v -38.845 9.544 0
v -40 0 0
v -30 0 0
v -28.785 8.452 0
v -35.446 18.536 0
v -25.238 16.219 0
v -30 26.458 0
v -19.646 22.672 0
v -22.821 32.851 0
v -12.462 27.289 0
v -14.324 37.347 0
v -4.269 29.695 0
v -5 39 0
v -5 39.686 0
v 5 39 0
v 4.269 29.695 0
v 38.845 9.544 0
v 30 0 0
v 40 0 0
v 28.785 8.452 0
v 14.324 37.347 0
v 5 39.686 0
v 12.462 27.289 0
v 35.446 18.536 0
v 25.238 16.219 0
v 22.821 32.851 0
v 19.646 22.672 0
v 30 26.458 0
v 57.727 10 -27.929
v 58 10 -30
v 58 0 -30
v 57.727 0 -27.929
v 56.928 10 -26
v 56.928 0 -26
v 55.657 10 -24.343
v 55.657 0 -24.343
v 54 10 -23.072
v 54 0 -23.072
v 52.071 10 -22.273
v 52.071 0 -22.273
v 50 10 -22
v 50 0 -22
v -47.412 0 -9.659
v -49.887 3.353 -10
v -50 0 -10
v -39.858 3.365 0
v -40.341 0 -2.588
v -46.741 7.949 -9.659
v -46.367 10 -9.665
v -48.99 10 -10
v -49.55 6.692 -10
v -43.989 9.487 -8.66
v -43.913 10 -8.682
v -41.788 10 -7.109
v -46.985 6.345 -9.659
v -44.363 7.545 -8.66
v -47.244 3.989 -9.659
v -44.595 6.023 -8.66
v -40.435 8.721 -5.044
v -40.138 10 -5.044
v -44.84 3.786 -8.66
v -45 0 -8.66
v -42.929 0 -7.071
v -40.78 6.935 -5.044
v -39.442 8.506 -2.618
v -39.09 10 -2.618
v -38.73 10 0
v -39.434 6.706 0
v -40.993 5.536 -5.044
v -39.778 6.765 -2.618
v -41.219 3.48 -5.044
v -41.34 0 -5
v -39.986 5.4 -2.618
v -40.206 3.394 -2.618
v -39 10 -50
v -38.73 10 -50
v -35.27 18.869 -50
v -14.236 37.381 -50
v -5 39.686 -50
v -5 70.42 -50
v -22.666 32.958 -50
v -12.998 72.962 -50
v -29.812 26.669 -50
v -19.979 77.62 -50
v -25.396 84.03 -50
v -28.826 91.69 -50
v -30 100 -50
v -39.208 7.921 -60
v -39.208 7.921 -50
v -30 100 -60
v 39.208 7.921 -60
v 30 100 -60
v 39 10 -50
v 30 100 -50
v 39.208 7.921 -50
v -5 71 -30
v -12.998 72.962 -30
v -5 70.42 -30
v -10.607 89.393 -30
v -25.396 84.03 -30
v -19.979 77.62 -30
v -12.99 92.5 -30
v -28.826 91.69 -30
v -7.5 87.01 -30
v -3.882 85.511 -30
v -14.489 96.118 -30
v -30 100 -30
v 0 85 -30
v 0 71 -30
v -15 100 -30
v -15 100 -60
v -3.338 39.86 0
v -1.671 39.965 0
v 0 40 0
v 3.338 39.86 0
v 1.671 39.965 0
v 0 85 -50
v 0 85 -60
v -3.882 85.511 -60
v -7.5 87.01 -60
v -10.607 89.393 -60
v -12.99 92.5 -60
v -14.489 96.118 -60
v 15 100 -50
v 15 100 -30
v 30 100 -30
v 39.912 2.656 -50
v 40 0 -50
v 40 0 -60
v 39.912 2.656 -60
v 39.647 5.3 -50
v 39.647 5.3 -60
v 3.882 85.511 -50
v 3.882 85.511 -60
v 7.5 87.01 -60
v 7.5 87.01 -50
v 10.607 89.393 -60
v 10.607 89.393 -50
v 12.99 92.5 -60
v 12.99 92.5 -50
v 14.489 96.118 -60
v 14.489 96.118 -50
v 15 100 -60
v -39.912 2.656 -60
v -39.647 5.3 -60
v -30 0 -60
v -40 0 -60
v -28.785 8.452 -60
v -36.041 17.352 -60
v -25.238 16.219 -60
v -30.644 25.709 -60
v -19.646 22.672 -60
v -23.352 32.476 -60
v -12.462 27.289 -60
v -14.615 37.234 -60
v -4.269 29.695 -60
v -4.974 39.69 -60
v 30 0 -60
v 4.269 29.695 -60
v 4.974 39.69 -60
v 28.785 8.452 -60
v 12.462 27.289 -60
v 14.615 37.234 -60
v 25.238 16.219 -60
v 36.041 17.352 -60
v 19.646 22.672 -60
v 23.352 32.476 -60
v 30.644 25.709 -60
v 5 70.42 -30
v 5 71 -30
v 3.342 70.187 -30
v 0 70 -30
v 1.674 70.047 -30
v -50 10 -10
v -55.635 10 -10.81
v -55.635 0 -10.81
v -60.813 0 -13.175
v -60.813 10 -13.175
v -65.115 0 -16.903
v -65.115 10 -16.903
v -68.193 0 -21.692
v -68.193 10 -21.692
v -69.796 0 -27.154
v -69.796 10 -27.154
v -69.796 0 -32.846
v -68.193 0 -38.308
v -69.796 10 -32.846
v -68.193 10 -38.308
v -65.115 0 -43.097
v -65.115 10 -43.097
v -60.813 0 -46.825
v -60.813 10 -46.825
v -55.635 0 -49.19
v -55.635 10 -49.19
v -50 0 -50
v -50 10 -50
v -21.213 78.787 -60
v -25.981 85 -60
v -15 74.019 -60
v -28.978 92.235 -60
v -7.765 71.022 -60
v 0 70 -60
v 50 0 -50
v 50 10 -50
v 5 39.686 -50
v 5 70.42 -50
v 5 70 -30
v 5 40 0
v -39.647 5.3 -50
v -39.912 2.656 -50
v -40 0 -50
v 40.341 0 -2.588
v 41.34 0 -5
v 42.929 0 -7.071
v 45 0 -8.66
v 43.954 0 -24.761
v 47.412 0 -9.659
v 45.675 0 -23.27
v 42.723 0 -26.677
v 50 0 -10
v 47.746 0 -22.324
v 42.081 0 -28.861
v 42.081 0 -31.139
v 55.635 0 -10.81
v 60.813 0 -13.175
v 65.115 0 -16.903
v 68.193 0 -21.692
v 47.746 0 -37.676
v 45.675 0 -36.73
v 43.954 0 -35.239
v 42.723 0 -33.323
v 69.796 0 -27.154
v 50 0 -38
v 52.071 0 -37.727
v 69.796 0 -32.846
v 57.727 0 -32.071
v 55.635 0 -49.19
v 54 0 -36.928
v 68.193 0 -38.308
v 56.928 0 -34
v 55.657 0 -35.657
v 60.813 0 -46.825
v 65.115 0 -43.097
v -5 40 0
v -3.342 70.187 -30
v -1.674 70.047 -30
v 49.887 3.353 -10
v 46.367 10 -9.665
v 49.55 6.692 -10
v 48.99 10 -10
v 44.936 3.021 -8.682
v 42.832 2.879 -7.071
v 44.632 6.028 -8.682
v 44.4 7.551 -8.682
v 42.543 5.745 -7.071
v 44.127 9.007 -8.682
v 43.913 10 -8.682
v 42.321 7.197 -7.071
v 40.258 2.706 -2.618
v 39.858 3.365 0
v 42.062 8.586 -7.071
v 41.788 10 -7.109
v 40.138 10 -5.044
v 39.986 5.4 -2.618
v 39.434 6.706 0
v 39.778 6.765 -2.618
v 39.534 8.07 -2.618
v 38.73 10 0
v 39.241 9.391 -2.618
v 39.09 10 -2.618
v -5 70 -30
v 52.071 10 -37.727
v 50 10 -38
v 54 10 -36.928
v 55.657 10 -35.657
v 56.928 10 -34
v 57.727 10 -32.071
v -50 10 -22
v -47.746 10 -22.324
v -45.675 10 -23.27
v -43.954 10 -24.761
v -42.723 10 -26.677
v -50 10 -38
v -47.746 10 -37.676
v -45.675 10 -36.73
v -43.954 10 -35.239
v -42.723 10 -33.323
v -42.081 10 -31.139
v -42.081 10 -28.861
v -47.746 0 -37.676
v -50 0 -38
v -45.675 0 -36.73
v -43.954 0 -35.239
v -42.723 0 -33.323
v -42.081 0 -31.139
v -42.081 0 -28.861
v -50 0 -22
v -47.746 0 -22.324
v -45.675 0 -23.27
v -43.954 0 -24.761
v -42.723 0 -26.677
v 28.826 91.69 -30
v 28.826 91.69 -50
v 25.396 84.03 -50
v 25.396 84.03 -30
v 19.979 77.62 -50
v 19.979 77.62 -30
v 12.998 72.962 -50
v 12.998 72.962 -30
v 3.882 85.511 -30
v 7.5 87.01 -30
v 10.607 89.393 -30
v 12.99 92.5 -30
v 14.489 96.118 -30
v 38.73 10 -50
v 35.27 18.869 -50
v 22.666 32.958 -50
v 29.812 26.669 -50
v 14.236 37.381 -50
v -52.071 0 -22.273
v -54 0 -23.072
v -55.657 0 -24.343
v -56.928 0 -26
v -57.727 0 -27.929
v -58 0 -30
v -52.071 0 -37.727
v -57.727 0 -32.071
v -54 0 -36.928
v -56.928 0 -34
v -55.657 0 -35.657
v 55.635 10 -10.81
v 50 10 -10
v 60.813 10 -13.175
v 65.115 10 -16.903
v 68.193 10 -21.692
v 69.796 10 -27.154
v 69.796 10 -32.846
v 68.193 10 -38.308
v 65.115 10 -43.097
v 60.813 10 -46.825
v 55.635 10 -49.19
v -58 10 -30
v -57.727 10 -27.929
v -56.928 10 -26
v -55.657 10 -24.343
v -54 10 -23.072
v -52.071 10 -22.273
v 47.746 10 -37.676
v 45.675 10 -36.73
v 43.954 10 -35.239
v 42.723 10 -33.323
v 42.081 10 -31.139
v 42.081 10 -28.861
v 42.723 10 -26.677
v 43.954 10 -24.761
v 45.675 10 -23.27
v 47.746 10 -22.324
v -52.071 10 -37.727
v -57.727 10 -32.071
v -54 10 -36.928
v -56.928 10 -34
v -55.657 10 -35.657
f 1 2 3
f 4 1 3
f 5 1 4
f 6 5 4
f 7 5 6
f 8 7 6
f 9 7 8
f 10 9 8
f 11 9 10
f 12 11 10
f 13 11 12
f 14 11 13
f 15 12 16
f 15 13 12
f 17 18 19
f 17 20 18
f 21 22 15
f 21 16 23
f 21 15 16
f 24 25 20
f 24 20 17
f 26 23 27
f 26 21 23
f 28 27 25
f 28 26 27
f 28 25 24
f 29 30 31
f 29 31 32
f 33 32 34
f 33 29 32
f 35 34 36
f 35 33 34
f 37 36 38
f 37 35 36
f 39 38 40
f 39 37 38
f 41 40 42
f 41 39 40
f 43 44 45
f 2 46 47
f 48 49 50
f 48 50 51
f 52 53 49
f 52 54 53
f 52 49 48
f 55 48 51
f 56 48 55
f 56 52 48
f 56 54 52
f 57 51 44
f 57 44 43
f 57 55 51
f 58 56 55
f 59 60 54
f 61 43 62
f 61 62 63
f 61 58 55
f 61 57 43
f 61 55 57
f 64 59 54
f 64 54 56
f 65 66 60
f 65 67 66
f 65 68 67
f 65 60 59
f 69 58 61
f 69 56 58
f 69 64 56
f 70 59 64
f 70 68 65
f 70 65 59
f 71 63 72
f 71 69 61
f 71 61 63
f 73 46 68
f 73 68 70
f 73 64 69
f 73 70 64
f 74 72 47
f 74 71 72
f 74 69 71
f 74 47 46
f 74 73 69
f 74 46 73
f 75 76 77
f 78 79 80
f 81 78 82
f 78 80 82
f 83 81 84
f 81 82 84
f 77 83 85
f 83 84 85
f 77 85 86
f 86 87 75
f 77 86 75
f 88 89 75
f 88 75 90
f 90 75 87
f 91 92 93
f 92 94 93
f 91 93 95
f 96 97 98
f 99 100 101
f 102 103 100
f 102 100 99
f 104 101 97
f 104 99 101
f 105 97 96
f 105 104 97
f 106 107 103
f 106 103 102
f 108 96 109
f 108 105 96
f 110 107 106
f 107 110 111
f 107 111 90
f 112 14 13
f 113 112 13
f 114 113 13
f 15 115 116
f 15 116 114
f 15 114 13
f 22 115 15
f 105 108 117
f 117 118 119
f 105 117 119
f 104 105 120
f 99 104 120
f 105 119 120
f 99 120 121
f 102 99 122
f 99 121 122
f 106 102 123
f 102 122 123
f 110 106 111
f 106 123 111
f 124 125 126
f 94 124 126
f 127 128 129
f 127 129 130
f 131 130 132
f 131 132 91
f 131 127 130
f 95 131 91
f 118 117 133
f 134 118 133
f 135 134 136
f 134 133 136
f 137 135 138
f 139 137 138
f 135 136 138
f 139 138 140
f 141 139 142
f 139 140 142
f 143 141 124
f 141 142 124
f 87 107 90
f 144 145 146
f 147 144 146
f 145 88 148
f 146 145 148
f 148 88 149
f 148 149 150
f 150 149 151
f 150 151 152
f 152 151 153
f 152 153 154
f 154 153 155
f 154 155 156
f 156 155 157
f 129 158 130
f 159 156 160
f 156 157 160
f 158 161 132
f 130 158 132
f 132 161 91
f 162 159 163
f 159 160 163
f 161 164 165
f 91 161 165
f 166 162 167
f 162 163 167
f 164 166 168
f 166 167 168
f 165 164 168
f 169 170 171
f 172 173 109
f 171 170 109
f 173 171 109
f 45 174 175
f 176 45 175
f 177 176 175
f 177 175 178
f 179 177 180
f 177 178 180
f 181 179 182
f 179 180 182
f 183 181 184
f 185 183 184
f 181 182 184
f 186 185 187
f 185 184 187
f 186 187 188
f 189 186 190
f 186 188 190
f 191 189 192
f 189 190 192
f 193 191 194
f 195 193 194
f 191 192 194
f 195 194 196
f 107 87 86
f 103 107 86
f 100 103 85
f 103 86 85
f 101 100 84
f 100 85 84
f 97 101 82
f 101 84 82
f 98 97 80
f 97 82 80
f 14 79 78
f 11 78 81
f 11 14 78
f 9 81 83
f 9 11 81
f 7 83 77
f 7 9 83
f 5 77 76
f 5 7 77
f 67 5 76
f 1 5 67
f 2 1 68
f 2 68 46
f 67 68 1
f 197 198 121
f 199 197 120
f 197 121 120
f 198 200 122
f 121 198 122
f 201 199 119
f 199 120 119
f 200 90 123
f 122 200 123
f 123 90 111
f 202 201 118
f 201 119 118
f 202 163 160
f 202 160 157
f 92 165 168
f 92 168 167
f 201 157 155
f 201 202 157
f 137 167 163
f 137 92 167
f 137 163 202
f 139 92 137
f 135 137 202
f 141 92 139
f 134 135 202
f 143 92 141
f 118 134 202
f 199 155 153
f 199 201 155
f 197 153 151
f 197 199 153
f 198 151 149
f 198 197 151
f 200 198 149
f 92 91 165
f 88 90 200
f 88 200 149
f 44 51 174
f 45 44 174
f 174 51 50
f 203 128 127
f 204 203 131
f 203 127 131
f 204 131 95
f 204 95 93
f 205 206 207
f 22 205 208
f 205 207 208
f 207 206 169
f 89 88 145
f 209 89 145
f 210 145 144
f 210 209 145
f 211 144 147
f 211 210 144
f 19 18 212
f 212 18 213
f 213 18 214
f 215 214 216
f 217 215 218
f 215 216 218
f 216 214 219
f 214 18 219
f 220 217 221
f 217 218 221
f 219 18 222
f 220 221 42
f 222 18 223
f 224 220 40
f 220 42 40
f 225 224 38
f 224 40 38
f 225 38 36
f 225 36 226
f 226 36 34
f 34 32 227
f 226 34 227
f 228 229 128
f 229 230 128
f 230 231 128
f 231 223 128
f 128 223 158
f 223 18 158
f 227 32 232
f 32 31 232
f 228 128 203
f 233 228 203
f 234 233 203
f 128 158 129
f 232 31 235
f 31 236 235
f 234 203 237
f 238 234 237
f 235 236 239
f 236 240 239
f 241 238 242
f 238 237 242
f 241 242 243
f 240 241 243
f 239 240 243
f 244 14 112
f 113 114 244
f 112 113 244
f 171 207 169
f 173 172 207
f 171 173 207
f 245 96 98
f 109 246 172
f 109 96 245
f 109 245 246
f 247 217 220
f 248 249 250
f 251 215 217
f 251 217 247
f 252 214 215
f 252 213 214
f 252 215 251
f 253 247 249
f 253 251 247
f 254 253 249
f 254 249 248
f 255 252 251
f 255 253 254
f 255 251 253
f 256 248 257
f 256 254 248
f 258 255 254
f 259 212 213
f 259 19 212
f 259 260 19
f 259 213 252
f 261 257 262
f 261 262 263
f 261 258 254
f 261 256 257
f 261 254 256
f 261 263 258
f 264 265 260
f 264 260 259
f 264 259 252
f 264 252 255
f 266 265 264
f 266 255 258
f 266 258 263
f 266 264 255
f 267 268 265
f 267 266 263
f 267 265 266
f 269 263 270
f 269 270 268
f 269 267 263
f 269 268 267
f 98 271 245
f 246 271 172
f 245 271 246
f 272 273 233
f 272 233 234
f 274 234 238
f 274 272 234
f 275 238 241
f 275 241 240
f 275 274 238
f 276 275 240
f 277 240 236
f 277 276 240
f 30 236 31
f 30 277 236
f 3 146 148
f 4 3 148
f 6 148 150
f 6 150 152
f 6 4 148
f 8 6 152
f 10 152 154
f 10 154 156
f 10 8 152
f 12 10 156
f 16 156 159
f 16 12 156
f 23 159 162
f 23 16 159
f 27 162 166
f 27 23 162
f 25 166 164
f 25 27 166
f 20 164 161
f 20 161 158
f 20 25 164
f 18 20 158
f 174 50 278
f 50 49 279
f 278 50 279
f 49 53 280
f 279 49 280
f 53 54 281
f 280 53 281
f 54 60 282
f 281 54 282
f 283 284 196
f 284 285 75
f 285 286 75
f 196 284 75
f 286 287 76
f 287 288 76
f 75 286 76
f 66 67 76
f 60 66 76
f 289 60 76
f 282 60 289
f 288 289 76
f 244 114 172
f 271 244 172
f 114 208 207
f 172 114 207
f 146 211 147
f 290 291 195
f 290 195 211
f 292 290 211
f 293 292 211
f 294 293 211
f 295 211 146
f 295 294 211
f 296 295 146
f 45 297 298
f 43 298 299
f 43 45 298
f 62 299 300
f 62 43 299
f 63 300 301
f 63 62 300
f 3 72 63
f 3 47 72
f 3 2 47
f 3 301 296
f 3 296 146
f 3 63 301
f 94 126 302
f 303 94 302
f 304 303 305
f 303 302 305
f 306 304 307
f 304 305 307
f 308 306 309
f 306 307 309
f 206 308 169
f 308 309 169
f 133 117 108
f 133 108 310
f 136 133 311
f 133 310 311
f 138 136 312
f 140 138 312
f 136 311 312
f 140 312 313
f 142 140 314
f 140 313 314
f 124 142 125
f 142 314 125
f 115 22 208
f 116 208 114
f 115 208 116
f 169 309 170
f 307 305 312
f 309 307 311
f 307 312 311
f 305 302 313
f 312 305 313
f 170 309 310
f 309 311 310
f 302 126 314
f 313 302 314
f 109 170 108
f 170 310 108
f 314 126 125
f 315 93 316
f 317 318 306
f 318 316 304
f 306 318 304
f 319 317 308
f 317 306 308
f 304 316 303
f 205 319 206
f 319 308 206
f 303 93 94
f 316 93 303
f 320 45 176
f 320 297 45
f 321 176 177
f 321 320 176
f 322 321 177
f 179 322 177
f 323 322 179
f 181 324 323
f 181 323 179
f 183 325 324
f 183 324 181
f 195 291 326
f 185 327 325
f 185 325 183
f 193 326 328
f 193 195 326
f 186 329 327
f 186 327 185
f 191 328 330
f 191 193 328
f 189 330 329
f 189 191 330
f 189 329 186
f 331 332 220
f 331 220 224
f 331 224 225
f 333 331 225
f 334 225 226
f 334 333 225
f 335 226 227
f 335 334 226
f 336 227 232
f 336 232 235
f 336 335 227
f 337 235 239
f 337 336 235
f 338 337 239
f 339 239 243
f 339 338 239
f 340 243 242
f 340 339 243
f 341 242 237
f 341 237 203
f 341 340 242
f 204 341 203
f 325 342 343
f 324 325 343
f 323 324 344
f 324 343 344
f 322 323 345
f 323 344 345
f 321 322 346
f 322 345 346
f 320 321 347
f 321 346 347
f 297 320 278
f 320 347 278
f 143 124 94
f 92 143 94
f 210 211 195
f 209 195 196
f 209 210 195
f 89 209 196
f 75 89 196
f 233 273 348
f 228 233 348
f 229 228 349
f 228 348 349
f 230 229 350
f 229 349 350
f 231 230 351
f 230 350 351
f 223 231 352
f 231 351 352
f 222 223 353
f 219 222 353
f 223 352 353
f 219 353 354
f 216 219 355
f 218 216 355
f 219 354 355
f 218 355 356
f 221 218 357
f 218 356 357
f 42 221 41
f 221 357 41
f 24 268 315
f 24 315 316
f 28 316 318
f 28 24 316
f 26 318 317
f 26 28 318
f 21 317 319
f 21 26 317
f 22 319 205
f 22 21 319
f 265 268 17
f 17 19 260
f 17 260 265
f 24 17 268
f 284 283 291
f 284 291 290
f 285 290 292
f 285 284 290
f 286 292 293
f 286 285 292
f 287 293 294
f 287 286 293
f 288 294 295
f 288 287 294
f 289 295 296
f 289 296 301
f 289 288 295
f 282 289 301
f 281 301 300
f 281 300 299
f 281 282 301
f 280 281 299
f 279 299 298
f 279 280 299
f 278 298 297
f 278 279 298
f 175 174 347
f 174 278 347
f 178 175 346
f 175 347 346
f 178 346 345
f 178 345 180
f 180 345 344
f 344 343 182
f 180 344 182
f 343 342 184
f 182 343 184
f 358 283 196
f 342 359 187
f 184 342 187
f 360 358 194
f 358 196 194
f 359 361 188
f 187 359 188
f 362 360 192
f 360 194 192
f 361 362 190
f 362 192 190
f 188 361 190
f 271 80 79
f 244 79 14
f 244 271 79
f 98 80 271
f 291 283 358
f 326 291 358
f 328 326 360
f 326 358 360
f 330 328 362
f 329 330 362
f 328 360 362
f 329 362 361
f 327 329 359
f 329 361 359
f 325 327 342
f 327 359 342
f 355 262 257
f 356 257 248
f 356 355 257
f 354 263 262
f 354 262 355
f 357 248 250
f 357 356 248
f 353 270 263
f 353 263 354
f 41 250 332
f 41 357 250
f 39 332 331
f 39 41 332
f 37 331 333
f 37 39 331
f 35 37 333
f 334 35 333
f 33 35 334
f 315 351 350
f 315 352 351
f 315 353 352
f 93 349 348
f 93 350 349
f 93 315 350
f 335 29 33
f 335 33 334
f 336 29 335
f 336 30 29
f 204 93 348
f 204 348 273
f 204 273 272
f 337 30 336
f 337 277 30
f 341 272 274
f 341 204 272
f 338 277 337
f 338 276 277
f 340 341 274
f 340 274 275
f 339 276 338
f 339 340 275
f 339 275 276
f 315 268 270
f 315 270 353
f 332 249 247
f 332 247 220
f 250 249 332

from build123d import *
from build123d.topology import SkipClean

# Parameters (mm, degrees)
BOSS_EXTRUDE2_DEPTH  = 60
BOSS_EXTRUDE3_START  = 30
SKETCH4_W            = 40
SKETCH4_H            = 10
BOSS_EXTRUDE3_DEPTH  = 20
FILLET1_R            = 10
FILLET2_R            = 10
BOSS_EXTRUDE7_DEPTH  = 10
CUT_EXTRUDE2_DEPTH   = 10
BOSS_EXTRUDE8_START  = -10
BOSS_EXTRUDE8_DEPTH  = 10
BOSS_EXTRUDE18_START = -30
BOSS_EXTRUDE18_DEPTH = 20
MIRROR9_START        = -60
MIRROR9_DEPTH        = 30
BOSS_EXTRUDE20_DEPTH = 5


# Read off the part's stored shape, not the designer's step: Boss-Extrude8, Boss-Extrude18, Mirror9
with BuildPart() as part:
    # Sketch1 → Boss-Extrude2 (new body)
    with BuildSketch(Plane.XY):
        with BuildLine():
            ThreePointArc((40, 0), (0, 40), (-40, 0))
            Line((-40, 0), (-30, 0))
            ThreePointArc((-30, 0), (0, 30), (30, 0))
            Line((30, 0), (40, 0))
        make_face()
    extrude(amount=-BOSS_EXTRUDE2_DEPTH)

    # Sketch4 → Boss-Extrude3 (add)
    with BuildSketch(Plane(origin=(0, 0, 0), x_dir=(0, 0, -1), z_dir=(1, 0, 0)).offset(BOSS_EXTRUDE3_START)):
        with Locations((30, 5)):
            Rectangle(SKETCH4_W, SKETCH4_H)
    boss_extrude3 = extrude(amount=BOSS_EXTRUDE3_DEPTH)

    # Mirror1: Boss-Extrude3 across plane
    add(boss_extrude3.mirror(Plane(origin=(0, 0, 0), x_dir=(0, 0, 1), z_dir=(1, 0, 0))))

    # Fillet1
    fillet1_edges = [part.edges().sort_by_distance(p)[0] for p in [
        (-39.681187851, 5.040171699, -10),
    ]]
    fillet(fillet1_edges, radius=FILLET1_R - 0.0001)  # a hair under: the kernel refuses the full size

    # Fillet2
    fillet2_edges = [part.edges().sort_by_distance(p)[0] for p in [
        (39.681187851, 5.040171699, -10),
    ]]
    fillet(fillet2_edges, radius=FILLET2_R - 0.0001)  # a hair under: the kernel refuses the full size

    # Sketch5 → Boss-Extrude7 (add)
    with BuildSketch(Plane(origin=(0, 10, 0), x_dir=(1, 0, 0), z_dir=(0, 1, 0))):
        with BuildLine():
            ThreePointArc((50, 10), (70, 30), (50, 50))
            Line((50, 50), (50, 38))
            ThreePointArc((50, 38), (55.656854249, 35.656854249), (58, 30))
            ThreePointArc((58, 30), (55.656854249, 24.343145751), (50, 22))
            Line((50, 22), (50, 10))
        make_face()
    boss_extrude7 = extrude(amount=-BOSS_EXTRUDE7_DEPTH)

    # Sketch5<5> → Cut-Extrude2 (cut)
    with SkipClean():  # the faces are left unmerged after this step: merging them gives an invalid solid
        with BuildSketch(Plane(origin=(0, 10, 0), x_dir=(1, 0, 0), z_dir=(0, 1, 0))):
            with BuildLine():
                Line((50, 22), (50, 38))
                ThreePointArc((50, 38), (42, 30), (50, 22))
            make_face()
            with BuildLine():
                ThreePointArc((58, 30), (55.656854249, 35.656854249), (50, 38))
                Line((50, 38), (50, 22))
                ThreePointArc((50, 22), (55.656854249, 24.343145751), (58, 30))
            make_face()
        cut_extrude2 = extrude(amount=-CUT_EXTRUDE2_DEPTH, mode=Mode.SUBTRACT)

    # Mirror3: Boss-Extrude7, Cut-Extrude2 across plane
    with SkipClean():  # the faces are left unmerged after this step: merging them gives an invalid solid
        add(boss_extrude7.mirror(Plane(origin=(0, 0, 0), x_dir=(0, 0, 1), z_dir=(1, 0, 0))))
        add(cut_extrude2.mirror(Plane(origin=(0, 0, 0), x_dir=(0, 0, 1), z_dir=(1, 0, 0))), mode=Mode.SUBTRACT)

    # Boss-Extrude8 outline → Boss-Extrude8 (add)
    with SkipClean():  # the faces are left unmerged after this step: merging them gives an invalid solid
        with BuildSketch(Plane(origin=(0, 0, -60), x_dir=(-1, 0, 0), z_dir=(0, 0, -1)).offset(BOSS_EXTRUDE8_START)):
            with BuildLine():
                ThreePointArc((30.000032068, 99.999679323), (21.213112735, 78.786660512), (0, 69.999967931))
                Line((0, 69.999967931), (0, 85))
                ThreePointArc((0, 85), (-10.606601718, 89.393398282), (-15, 100))
                Line((-15, 100), (-30, 100))
                Line((-30, 100), (-39.207920792, 7.920792079))
                ThreePointArc((-39.207920792, 7.920792079), (0, 40), (39.207920792, 7.920792079))
                Line((39.207920792, 7.920792079), (30.000032068, 99.999679323))
            make_face()
        extrude(amount=BOSS_EXTRUDE8_DEPTH)

    # Boss-Extrude18 outline → Boss-Extrude18 (add)
    with SkipClean():  # the faces are left unmerged after this step: merging them gives an invalid solid
        with BuildSketch(Plane(origin=(0, 0, -60), x_dir=(-1, 0, 0), z_dir=(0, 0, -1)).offset(BOSS_EXTRUDE18_START)):
            with BuildLine():
                ThreePointArc((0, 85), (-10.606601718, 89.393398282), (-15, 100))
                Line((-15, 100), (-30, 100))
                Line((-30, 100), (-30.000032068, 99.999679323))
                ThreePointArc((-30.000032068, 99.999679323), (-21.213112735, 78.786660512), (0, 69.999967931))
                Line((0, 69.999967931), (0, 85))
            make_face()
        extrude(amount=BOSS_EXTRUDE18_DEPTH)

    # Mirror9 outline → Mirror9 (add)
    with SkipClean():  # the faces are left unmerged after this step: merging them gives an invalid solid
        with BuildSketch(Plane.XY.offset(MIRROR9_START)):
            with BuildLine():
                Line((-15, 100), (-30, 100))
                Line((-30, 100), (-30.000032068, 99.999679323))
                ThreePointArc((-30.000032068, 99.999679323), (-21.213112735, 78.786660512), (0, 69.999967931))
                Line((0, 69.999967931), (0, 85))
                ThreePointArc((0, 85), (-10.606601718, 89.393398282), (-15, 100))
            make_face()
        extrude(amount=MIRROR9_DEPTH)

    # Sketch7 → Boss-Extrude20 (add, symmetric)
    with SkipClean():  # the faces are left unmerged after this step: merging them gives an invalid solid
        with BuildSketch(Plane(origin=(0, 0, 0), x_dir=(0, 0, -1), z_dir=(1, 0, 0))):
            Polygon((0, 40), (30, 69.999967931), (30, 70.999967931), (50, 70.999967931), (50, 69.999967931), (50, 40), (50, 39), (0, 39), align=None)
        extrude(amount=BOSS_EXTRUDE20_DEPTH, both=True)


solid = part.part
